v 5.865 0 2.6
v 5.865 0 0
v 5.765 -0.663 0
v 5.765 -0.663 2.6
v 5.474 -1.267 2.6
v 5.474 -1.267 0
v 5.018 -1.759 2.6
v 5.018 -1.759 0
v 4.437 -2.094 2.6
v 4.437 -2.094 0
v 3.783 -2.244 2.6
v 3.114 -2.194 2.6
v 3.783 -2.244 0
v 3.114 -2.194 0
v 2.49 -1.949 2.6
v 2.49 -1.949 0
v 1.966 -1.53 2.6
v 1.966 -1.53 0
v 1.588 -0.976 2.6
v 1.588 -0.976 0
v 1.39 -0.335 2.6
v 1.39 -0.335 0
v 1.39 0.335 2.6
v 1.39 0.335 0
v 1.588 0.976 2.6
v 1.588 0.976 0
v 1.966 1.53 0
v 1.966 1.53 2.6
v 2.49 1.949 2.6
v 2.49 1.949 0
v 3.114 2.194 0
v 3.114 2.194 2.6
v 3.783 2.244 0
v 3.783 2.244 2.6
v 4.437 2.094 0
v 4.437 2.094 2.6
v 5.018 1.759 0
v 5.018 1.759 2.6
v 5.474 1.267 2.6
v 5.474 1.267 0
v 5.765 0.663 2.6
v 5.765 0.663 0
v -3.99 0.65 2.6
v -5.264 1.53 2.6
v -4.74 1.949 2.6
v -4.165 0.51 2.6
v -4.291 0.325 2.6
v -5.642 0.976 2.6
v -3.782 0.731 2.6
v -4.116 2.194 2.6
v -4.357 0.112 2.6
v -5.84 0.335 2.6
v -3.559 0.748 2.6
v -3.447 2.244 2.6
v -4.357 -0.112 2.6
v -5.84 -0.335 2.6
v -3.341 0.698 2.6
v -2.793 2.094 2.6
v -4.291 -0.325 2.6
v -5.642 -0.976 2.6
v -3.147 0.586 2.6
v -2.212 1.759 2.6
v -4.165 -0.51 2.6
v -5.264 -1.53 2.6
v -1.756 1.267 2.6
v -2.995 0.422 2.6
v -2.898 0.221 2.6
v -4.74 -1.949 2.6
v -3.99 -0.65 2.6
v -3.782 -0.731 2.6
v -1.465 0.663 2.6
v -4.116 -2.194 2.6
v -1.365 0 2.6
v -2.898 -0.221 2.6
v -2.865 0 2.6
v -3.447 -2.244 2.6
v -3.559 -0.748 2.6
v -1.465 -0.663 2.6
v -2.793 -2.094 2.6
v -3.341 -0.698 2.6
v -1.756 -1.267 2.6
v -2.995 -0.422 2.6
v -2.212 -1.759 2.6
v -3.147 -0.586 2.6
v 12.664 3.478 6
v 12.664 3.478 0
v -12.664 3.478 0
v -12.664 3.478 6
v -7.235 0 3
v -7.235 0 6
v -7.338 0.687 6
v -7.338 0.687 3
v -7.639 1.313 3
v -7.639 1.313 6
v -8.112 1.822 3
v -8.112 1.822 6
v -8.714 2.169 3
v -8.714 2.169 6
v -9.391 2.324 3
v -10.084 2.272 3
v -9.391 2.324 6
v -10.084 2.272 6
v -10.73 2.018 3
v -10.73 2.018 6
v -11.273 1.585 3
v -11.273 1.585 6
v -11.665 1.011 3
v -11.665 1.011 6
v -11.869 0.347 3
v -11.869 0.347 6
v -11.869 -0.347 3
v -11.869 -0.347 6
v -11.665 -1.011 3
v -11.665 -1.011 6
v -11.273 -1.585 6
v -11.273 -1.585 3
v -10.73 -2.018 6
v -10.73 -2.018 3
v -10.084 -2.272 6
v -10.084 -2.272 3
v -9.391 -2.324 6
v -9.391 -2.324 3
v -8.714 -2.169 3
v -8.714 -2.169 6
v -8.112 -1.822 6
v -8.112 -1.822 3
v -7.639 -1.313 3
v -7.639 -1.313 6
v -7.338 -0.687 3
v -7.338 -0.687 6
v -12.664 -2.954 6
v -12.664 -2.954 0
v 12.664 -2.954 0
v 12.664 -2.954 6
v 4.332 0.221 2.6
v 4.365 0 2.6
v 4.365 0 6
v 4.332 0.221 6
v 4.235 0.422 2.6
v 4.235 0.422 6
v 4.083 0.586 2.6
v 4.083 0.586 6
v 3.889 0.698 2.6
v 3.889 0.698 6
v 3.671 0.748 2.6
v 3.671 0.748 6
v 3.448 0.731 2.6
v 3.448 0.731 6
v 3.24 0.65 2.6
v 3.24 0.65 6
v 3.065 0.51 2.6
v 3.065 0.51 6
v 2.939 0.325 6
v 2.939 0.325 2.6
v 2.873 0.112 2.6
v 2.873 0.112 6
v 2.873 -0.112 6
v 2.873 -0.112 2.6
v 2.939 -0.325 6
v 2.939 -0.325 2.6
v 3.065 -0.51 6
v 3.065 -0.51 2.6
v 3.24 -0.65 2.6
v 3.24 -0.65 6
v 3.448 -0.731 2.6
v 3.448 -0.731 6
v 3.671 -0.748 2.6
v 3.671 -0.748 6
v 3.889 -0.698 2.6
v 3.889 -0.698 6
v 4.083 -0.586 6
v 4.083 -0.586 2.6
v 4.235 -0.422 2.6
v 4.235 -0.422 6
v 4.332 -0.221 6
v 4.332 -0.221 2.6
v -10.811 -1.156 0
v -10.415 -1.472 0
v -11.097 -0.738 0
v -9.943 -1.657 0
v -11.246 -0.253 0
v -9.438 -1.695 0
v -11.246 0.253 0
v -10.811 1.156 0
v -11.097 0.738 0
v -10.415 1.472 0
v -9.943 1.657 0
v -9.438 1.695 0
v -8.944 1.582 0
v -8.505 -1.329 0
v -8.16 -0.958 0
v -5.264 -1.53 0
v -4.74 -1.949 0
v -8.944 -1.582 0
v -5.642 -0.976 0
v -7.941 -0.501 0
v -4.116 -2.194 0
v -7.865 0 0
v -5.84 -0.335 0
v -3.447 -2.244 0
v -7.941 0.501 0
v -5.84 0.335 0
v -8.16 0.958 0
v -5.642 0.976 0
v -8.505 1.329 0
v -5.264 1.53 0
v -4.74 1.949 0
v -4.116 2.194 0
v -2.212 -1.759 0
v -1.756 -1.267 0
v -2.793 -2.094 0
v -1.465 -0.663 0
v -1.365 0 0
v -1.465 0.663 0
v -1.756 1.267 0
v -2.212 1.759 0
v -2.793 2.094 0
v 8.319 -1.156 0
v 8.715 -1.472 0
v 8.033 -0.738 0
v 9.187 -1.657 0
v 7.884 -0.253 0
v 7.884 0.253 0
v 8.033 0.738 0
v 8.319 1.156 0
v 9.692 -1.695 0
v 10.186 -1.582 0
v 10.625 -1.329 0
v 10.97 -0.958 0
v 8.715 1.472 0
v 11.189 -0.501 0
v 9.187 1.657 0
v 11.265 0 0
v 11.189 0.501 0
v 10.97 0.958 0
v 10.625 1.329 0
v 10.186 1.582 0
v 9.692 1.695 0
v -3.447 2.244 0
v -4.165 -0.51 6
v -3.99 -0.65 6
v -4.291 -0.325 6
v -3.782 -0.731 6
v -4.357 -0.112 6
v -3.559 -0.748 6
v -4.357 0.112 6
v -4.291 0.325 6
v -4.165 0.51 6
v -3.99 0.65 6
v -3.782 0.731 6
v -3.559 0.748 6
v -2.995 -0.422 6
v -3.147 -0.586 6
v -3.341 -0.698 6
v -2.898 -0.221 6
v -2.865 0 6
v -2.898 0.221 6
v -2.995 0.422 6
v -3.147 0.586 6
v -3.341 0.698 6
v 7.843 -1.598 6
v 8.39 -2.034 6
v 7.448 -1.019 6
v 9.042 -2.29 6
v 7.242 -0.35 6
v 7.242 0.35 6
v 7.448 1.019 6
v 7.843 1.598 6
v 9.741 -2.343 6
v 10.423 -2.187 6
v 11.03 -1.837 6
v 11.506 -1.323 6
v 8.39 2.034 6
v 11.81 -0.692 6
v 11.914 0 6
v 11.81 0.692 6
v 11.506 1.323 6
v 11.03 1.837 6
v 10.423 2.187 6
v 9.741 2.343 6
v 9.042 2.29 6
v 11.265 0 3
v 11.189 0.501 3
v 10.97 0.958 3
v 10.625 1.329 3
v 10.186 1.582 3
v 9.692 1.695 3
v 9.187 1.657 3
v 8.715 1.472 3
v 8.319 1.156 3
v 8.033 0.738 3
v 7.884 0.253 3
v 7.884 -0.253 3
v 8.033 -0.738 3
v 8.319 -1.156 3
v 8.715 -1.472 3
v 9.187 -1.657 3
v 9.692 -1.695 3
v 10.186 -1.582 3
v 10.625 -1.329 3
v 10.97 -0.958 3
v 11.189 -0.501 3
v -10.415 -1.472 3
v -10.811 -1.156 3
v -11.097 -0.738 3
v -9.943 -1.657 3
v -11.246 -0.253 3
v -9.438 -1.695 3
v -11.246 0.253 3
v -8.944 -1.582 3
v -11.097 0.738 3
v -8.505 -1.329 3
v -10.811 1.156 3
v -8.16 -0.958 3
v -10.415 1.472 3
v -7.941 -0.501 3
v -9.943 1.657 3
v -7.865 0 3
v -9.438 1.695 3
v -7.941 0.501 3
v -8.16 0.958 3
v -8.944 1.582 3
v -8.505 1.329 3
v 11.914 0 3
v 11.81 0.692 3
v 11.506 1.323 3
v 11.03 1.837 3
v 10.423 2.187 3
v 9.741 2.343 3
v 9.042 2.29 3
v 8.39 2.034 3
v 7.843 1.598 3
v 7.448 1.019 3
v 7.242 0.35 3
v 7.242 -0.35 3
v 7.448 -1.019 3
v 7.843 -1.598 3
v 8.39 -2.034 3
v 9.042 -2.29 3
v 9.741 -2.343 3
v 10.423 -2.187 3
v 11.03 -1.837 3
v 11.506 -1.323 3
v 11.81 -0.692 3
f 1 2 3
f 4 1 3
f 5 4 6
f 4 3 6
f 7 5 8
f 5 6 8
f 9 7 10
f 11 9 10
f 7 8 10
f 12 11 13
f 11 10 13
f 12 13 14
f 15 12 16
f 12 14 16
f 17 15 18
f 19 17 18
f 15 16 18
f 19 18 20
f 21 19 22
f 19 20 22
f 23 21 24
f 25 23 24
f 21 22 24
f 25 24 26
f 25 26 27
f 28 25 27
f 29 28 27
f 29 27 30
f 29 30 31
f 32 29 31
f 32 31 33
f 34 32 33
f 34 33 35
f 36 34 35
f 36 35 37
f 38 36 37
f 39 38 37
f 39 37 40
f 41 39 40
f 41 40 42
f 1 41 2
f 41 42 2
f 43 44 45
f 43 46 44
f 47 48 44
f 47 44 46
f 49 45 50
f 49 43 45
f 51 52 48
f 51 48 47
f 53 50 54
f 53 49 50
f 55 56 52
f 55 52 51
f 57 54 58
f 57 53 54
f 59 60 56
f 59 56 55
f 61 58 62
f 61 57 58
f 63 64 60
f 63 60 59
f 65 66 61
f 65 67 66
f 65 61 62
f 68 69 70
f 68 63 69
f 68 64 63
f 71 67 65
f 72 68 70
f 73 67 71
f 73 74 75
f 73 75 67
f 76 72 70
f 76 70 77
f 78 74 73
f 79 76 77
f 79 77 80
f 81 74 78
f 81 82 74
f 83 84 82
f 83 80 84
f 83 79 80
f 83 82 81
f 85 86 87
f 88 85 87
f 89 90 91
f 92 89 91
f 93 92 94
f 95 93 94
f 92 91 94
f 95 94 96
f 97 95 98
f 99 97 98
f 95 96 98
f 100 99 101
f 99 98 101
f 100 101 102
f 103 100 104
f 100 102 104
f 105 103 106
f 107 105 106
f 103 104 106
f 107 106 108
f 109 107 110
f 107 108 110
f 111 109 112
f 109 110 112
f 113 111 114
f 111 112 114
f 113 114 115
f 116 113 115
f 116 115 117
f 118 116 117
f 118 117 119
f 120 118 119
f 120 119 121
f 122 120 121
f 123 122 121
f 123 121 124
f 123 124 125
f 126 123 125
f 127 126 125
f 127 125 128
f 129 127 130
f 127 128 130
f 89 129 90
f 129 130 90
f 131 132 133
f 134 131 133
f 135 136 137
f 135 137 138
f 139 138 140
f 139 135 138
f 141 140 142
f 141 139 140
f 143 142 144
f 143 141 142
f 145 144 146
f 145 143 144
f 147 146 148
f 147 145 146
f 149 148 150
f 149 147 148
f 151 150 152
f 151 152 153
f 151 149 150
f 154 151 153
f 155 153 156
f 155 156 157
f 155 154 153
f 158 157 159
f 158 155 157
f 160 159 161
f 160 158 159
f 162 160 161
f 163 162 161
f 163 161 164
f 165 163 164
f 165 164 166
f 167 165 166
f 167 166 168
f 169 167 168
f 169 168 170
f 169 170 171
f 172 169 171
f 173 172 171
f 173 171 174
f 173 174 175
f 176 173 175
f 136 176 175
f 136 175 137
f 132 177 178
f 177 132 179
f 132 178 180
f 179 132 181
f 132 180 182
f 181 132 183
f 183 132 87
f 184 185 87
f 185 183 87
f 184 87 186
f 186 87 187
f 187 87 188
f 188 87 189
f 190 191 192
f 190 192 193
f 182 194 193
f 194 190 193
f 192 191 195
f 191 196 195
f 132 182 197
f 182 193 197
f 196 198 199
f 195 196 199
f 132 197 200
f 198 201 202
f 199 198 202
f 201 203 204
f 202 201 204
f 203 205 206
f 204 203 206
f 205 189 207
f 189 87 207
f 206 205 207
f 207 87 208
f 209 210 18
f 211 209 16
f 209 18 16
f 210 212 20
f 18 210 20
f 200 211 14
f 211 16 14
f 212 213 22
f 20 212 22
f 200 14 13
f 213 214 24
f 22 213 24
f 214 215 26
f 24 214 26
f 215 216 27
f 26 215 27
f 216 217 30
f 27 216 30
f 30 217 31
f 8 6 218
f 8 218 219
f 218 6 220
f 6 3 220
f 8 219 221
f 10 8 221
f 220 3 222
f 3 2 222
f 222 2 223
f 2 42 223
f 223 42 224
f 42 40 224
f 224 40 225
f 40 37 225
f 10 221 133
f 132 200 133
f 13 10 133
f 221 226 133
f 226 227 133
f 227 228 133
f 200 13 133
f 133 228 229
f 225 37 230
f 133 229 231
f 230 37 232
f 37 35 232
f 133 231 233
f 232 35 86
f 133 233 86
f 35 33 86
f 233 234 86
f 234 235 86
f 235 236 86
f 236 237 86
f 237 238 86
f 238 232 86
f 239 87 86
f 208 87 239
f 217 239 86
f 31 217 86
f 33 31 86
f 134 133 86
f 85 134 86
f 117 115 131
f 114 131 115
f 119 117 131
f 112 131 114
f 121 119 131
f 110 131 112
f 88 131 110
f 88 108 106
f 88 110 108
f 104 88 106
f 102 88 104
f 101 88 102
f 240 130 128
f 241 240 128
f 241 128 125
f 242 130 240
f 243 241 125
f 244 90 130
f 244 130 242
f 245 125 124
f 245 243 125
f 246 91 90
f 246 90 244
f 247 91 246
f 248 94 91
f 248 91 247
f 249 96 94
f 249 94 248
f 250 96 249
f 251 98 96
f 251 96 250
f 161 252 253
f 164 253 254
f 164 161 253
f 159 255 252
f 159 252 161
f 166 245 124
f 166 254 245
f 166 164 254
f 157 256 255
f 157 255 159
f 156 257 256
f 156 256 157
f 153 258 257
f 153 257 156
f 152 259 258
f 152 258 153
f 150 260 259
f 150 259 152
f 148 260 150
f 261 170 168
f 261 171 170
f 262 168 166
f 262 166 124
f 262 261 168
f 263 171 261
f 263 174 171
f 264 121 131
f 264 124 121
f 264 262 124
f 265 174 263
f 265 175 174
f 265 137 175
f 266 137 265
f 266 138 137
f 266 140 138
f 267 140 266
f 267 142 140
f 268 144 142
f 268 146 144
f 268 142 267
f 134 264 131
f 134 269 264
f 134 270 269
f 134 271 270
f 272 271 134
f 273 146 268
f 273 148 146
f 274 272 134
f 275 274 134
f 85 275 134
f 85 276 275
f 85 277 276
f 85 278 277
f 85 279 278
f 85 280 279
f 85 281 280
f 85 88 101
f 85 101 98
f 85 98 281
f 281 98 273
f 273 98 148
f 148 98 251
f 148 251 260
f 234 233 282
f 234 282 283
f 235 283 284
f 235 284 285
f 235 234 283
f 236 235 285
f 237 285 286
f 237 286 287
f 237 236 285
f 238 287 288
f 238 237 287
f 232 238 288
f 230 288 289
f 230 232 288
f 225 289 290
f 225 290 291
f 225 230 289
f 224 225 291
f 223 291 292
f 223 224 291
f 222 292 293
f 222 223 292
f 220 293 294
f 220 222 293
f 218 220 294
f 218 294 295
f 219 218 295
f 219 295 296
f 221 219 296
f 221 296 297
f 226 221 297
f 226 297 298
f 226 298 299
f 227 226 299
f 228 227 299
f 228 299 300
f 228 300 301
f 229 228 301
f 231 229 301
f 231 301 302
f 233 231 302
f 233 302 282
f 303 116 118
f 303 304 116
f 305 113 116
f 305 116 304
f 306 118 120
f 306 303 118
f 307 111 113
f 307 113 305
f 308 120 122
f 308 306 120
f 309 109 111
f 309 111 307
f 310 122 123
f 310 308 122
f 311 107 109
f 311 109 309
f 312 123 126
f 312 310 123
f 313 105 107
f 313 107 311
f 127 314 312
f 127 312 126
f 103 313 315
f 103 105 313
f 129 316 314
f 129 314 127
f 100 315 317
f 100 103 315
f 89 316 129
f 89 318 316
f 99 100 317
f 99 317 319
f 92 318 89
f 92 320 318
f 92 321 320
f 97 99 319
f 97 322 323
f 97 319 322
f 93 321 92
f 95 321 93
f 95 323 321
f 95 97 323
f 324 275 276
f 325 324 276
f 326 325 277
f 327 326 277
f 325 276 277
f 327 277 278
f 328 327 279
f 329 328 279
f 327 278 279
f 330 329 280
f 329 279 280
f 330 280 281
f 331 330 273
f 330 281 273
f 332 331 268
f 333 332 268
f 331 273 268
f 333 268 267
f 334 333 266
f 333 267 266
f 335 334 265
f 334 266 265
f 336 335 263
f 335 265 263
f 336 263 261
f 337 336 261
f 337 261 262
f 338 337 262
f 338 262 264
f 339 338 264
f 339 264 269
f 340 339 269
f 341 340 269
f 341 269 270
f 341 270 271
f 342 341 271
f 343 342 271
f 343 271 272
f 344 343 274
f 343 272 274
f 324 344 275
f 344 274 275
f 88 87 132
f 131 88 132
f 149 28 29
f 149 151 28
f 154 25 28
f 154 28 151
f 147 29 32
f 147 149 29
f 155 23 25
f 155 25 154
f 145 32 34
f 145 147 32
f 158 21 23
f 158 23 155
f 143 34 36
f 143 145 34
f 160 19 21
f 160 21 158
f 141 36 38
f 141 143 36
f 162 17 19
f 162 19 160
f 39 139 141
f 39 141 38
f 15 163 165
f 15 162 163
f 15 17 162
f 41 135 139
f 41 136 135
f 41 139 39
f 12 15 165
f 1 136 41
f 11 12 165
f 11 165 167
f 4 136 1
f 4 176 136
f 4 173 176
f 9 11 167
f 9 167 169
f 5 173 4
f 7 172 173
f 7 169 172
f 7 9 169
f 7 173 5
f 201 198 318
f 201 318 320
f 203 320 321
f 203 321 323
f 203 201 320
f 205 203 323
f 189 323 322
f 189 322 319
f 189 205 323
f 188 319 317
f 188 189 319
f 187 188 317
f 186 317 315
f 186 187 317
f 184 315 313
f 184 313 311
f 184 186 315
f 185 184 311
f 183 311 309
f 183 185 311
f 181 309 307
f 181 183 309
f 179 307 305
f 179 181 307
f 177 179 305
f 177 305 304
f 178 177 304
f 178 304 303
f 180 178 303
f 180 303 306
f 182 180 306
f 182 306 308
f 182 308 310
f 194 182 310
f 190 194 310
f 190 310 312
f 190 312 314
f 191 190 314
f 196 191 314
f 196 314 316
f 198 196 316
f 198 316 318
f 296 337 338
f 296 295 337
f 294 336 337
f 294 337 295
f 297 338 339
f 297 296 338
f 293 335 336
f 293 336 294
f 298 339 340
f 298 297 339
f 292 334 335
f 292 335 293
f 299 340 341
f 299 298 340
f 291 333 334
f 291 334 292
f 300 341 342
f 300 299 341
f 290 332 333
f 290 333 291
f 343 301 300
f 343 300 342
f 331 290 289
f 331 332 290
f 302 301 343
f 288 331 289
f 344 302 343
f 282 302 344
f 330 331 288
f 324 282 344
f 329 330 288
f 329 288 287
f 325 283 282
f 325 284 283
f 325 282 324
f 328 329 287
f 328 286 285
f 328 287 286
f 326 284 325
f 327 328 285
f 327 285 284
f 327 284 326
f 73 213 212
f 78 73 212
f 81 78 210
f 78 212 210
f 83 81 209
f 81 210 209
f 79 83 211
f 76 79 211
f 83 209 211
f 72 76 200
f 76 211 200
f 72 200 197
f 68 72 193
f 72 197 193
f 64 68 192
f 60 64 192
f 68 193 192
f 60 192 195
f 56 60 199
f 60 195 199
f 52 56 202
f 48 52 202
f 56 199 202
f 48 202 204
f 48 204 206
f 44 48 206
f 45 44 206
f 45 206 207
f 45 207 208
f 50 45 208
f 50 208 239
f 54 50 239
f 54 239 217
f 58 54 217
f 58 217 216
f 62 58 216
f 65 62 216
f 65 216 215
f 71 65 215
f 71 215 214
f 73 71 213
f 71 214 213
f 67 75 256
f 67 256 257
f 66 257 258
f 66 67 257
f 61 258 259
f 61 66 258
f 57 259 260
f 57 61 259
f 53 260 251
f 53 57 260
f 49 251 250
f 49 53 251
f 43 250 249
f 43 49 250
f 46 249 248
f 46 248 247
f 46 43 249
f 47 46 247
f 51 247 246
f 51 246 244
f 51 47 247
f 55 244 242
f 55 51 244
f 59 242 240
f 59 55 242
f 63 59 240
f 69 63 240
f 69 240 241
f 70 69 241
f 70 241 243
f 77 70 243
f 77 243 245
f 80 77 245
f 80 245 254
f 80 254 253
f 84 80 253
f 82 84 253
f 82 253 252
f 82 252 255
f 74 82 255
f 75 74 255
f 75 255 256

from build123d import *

# Parameters (mm, degrees)
F0_R     = 1.7
F0_R_2   = 0.75
F1_DEPTH = 6
F2_R     = 2.330452
F2_R_2   = 1.7
F2_R_3   = 2.349172
F3_DEPTH = 3
F4_R     = 2.25
F4_R_2   = 0.75
F5_DEPTH = 2.6


with BuildPart() as f1:
    # F0 (on Top) → F1 (new body)
    with BuildSketch(Plane.XY):
        Polygon((12.663894, 0), (12.663894, 3.477627), (-12.663894, 3.477627), (-12.663894, -2.954399), (12.663894, -2.954399), align=None)
        with Locations((-9.565, 0)):
            Circle(F0_R, mode=Mode.SUBTRACT)
        with Locations((-3.615, 0)):
            Circle(F0_R_2, mode=Mode.SUBTRACT)
        with Locations((3.615, 0)):
            Circle(F0_R_2, mode=Mode.SUBTRACT)
        with Locations((9.565, 0)):
            Circle(F0_R, mode=Mode.SUBTRACT)
    extrude(amount=F1_DEPTH)

    # F2 (on face) → F3 (cut)
    with BuildSketch(Plane.XY.offset(6)):
        with Locations((-9.565, 0)):
            Circle(F2_R)
        with Locations((-9.565, 0)):
            Circle(F2_R_2, mode=Mode.SUBTRACT)
        with Locations((9.565, 0)):
            Circle(F2_R_3)
        with Locations((9.565, 0)):
            Circle(F2_R_2, mode=Mode.SUBTRACT)
    extrude(amount=-F3_DEPTH, mode=Mode.SUBTRACT)

    # F4 (on face) → F5 (cut)
    with BuildSketch(Plane(origin=(0, 0, 0), x_dir=(1, 0, 0), z_dir=(0, 0, -1))):
        with Locations((-3.615, 0)):
            Circle(F4_R)
        with Locations((-3.615, 0)):
            Circle(F4_R_2, mode=Mode.SUBTRACT)
        with Locations((3.615, 0)):
            Circle(F4_R)
        with Locations((3.615, 0)):
            Circle(F4_R_2, mode=Mode.SUBTRACT)
    extrude(amount=-F5_DEPTH, mode=Mode.SUBTRACT)


solid = f1.part
